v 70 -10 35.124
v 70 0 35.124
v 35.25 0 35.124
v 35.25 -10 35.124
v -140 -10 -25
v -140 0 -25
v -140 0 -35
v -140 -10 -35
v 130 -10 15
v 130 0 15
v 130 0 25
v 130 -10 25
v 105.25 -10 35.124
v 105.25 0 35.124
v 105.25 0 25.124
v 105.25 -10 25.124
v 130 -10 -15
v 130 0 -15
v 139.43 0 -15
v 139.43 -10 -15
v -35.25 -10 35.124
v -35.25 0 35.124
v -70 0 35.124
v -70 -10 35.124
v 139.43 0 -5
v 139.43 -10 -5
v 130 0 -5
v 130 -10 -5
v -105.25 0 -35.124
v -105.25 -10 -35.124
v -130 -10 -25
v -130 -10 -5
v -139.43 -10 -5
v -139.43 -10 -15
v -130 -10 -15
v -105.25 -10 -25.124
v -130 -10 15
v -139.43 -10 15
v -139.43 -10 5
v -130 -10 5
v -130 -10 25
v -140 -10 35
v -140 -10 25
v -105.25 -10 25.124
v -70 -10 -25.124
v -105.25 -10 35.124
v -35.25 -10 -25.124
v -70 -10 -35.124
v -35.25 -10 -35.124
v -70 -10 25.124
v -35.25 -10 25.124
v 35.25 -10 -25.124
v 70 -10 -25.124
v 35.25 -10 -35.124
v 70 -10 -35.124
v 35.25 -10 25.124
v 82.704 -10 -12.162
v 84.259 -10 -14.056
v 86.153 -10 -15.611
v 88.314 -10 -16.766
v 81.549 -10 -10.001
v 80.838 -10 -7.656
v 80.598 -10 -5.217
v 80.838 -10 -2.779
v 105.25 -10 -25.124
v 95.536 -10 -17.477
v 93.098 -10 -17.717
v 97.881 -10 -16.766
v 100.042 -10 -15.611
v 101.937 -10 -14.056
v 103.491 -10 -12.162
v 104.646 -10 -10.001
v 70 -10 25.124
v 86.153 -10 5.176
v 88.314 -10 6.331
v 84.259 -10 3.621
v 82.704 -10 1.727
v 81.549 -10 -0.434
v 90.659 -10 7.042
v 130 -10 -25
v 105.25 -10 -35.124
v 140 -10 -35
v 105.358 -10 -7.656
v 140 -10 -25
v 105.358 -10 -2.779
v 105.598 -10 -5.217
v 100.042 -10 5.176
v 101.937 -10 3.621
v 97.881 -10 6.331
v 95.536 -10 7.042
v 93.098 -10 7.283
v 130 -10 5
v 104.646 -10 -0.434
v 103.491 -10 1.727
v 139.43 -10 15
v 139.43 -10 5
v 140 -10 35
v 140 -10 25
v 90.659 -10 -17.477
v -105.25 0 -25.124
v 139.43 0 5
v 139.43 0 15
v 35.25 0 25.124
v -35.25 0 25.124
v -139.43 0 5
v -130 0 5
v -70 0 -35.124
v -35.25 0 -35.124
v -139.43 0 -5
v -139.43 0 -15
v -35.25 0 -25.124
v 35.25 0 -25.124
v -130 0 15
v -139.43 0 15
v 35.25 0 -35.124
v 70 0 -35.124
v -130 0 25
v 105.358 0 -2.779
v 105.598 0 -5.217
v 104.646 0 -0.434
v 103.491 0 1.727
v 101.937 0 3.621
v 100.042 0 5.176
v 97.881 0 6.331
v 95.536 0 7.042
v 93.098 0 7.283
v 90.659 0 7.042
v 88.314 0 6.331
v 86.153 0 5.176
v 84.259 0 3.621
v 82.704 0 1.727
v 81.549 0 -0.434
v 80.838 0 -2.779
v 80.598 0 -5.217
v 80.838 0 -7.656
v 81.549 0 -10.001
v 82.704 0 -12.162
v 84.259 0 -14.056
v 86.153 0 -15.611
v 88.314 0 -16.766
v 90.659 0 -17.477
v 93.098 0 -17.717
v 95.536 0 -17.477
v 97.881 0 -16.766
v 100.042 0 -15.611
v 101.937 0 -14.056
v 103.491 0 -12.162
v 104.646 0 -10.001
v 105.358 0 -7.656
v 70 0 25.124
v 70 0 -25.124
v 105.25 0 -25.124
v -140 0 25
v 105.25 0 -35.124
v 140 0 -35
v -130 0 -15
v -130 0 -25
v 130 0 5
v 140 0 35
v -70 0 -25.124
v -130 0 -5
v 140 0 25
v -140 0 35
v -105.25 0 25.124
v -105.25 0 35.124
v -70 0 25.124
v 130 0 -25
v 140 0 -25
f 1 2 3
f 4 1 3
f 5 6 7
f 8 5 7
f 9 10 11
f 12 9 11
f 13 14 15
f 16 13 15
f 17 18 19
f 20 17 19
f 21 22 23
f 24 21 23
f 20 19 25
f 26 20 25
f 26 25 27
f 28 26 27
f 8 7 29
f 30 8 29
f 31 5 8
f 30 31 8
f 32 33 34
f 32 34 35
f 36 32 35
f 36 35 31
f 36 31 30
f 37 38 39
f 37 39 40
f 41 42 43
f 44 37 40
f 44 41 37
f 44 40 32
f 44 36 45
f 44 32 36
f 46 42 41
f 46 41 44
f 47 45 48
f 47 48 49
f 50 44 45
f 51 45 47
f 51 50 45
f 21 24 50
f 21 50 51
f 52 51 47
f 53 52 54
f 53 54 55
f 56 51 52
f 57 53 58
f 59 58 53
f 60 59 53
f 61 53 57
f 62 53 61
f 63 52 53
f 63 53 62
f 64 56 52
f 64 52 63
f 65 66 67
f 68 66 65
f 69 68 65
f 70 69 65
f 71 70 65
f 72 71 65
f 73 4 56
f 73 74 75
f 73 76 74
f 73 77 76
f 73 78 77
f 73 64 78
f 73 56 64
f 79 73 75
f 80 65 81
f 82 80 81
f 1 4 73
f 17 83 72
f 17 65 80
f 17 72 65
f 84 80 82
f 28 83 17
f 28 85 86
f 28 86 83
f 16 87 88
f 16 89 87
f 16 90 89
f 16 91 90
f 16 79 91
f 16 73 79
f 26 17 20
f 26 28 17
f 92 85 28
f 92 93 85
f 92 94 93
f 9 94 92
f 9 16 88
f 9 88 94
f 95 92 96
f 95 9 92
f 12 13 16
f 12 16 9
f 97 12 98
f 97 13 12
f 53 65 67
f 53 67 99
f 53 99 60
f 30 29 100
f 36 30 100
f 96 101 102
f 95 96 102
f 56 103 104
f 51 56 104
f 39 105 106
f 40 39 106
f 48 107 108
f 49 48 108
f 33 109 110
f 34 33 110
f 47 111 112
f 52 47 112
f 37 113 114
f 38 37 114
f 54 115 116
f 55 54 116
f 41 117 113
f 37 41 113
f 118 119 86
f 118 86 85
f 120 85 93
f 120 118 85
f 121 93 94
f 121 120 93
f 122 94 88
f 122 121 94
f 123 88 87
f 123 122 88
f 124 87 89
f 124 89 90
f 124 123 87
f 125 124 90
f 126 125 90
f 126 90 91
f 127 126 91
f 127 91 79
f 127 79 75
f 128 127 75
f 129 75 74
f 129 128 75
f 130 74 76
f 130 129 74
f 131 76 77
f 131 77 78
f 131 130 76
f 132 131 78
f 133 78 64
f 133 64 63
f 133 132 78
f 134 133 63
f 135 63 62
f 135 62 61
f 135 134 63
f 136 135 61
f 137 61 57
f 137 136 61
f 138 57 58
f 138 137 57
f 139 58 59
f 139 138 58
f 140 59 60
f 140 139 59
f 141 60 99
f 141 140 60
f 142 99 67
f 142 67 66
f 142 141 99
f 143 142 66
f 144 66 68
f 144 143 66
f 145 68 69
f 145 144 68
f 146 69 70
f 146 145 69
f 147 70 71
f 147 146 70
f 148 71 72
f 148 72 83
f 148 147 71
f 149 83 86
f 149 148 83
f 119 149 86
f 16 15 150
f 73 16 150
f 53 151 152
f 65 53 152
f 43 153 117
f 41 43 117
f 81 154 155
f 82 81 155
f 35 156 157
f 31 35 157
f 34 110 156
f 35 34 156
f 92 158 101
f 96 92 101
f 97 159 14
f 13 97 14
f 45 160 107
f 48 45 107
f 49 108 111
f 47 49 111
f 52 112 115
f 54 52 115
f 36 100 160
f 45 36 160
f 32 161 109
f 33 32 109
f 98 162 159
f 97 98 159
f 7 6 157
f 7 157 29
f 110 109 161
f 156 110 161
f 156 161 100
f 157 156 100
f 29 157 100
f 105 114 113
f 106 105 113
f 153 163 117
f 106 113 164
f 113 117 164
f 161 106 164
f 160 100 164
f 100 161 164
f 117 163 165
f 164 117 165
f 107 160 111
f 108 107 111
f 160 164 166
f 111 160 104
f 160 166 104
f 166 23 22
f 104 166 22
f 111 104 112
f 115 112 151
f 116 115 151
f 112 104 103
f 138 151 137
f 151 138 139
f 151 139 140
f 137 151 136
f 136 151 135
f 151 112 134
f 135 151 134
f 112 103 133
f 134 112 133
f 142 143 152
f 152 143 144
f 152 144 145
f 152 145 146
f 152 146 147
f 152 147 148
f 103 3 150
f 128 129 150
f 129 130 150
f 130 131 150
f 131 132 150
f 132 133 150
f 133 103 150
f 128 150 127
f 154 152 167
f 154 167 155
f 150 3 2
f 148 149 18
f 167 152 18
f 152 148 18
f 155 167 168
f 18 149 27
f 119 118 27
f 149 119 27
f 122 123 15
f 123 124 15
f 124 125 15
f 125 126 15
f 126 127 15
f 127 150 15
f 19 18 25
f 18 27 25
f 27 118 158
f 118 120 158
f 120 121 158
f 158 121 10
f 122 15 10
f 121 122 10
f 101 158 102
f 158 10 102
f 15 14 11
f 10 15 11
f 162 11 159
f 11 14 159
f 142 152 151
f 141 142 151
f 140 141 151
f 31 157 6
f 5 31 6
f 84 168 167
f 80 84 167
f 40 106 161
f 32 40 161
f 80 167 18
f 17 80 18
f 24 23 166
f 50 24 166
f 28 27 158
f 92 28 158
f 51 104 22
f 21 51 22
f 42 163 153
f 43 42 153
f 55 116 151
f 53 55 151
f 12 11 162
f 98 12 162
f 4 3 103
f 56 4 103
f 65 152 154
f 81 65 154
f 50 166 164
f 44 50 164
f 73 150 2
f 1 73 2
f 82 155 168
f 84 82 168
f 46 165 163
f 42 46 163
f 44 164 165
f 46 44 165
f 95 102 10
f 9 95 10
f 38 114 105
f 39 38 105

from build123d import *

# Parameters (mm, degrees)
F0_R     = 12.5
F1_DEPTH = 10


with BuildPart() as f1:
    # F0 (on Front) → F1 (new body)
    with BuildSketch(Plane.XZ):
        Polygon((105.25, -35.124361), (140, -35), (140, -25), (130, -25), (130, -15), (139.429527, -15), (139.429527, -5), (130, -5), (130, 5), (139.429527, 5), (139.429527, 15), (130, 15), (130, 25), (140, 25), (140, 35), (105.25, 35.124361), (105.25, 25.124361), (70, 25.124361), (70, 35.124361), (35.25, 35.124361), (35.25, 25.124361), (0, 25.124361), (-35.25, 25.124361), (-35.25, 35.124361), (-70, 35.124361), (-70, 25.124361), (-105.25, 25.124361), (-105.25, 35.124361), (-140, 35), (-140, 25), (-130, 25), (-130, 15), (-139.429527, 15), (-139.429527, 5), (-130, 5), (-130, -5), (-139.429527, -5), (-139.429527, -15), (-130, -15), (-130, -25), (-140, -25), (-140, -35), (-105.25, -35.124361), (-105.25, -25.124361), (-70, -25.124361), (-70, -35.124361), (-35.25, -35.124361), (-35.25, -25.124361), (0, -25.124361), (35.25, -25.124361), (35.25, -35.124361), (70, -35.124361), (70, -25.124361), (105.25, -25.124361), align=None)
        with Locations((93.097828, -5.217392)):
            Circle(F0_R, mode=Mode.SUBTRACT)
    extrude(amount=F1_DEPTH)


solid = f1.part
